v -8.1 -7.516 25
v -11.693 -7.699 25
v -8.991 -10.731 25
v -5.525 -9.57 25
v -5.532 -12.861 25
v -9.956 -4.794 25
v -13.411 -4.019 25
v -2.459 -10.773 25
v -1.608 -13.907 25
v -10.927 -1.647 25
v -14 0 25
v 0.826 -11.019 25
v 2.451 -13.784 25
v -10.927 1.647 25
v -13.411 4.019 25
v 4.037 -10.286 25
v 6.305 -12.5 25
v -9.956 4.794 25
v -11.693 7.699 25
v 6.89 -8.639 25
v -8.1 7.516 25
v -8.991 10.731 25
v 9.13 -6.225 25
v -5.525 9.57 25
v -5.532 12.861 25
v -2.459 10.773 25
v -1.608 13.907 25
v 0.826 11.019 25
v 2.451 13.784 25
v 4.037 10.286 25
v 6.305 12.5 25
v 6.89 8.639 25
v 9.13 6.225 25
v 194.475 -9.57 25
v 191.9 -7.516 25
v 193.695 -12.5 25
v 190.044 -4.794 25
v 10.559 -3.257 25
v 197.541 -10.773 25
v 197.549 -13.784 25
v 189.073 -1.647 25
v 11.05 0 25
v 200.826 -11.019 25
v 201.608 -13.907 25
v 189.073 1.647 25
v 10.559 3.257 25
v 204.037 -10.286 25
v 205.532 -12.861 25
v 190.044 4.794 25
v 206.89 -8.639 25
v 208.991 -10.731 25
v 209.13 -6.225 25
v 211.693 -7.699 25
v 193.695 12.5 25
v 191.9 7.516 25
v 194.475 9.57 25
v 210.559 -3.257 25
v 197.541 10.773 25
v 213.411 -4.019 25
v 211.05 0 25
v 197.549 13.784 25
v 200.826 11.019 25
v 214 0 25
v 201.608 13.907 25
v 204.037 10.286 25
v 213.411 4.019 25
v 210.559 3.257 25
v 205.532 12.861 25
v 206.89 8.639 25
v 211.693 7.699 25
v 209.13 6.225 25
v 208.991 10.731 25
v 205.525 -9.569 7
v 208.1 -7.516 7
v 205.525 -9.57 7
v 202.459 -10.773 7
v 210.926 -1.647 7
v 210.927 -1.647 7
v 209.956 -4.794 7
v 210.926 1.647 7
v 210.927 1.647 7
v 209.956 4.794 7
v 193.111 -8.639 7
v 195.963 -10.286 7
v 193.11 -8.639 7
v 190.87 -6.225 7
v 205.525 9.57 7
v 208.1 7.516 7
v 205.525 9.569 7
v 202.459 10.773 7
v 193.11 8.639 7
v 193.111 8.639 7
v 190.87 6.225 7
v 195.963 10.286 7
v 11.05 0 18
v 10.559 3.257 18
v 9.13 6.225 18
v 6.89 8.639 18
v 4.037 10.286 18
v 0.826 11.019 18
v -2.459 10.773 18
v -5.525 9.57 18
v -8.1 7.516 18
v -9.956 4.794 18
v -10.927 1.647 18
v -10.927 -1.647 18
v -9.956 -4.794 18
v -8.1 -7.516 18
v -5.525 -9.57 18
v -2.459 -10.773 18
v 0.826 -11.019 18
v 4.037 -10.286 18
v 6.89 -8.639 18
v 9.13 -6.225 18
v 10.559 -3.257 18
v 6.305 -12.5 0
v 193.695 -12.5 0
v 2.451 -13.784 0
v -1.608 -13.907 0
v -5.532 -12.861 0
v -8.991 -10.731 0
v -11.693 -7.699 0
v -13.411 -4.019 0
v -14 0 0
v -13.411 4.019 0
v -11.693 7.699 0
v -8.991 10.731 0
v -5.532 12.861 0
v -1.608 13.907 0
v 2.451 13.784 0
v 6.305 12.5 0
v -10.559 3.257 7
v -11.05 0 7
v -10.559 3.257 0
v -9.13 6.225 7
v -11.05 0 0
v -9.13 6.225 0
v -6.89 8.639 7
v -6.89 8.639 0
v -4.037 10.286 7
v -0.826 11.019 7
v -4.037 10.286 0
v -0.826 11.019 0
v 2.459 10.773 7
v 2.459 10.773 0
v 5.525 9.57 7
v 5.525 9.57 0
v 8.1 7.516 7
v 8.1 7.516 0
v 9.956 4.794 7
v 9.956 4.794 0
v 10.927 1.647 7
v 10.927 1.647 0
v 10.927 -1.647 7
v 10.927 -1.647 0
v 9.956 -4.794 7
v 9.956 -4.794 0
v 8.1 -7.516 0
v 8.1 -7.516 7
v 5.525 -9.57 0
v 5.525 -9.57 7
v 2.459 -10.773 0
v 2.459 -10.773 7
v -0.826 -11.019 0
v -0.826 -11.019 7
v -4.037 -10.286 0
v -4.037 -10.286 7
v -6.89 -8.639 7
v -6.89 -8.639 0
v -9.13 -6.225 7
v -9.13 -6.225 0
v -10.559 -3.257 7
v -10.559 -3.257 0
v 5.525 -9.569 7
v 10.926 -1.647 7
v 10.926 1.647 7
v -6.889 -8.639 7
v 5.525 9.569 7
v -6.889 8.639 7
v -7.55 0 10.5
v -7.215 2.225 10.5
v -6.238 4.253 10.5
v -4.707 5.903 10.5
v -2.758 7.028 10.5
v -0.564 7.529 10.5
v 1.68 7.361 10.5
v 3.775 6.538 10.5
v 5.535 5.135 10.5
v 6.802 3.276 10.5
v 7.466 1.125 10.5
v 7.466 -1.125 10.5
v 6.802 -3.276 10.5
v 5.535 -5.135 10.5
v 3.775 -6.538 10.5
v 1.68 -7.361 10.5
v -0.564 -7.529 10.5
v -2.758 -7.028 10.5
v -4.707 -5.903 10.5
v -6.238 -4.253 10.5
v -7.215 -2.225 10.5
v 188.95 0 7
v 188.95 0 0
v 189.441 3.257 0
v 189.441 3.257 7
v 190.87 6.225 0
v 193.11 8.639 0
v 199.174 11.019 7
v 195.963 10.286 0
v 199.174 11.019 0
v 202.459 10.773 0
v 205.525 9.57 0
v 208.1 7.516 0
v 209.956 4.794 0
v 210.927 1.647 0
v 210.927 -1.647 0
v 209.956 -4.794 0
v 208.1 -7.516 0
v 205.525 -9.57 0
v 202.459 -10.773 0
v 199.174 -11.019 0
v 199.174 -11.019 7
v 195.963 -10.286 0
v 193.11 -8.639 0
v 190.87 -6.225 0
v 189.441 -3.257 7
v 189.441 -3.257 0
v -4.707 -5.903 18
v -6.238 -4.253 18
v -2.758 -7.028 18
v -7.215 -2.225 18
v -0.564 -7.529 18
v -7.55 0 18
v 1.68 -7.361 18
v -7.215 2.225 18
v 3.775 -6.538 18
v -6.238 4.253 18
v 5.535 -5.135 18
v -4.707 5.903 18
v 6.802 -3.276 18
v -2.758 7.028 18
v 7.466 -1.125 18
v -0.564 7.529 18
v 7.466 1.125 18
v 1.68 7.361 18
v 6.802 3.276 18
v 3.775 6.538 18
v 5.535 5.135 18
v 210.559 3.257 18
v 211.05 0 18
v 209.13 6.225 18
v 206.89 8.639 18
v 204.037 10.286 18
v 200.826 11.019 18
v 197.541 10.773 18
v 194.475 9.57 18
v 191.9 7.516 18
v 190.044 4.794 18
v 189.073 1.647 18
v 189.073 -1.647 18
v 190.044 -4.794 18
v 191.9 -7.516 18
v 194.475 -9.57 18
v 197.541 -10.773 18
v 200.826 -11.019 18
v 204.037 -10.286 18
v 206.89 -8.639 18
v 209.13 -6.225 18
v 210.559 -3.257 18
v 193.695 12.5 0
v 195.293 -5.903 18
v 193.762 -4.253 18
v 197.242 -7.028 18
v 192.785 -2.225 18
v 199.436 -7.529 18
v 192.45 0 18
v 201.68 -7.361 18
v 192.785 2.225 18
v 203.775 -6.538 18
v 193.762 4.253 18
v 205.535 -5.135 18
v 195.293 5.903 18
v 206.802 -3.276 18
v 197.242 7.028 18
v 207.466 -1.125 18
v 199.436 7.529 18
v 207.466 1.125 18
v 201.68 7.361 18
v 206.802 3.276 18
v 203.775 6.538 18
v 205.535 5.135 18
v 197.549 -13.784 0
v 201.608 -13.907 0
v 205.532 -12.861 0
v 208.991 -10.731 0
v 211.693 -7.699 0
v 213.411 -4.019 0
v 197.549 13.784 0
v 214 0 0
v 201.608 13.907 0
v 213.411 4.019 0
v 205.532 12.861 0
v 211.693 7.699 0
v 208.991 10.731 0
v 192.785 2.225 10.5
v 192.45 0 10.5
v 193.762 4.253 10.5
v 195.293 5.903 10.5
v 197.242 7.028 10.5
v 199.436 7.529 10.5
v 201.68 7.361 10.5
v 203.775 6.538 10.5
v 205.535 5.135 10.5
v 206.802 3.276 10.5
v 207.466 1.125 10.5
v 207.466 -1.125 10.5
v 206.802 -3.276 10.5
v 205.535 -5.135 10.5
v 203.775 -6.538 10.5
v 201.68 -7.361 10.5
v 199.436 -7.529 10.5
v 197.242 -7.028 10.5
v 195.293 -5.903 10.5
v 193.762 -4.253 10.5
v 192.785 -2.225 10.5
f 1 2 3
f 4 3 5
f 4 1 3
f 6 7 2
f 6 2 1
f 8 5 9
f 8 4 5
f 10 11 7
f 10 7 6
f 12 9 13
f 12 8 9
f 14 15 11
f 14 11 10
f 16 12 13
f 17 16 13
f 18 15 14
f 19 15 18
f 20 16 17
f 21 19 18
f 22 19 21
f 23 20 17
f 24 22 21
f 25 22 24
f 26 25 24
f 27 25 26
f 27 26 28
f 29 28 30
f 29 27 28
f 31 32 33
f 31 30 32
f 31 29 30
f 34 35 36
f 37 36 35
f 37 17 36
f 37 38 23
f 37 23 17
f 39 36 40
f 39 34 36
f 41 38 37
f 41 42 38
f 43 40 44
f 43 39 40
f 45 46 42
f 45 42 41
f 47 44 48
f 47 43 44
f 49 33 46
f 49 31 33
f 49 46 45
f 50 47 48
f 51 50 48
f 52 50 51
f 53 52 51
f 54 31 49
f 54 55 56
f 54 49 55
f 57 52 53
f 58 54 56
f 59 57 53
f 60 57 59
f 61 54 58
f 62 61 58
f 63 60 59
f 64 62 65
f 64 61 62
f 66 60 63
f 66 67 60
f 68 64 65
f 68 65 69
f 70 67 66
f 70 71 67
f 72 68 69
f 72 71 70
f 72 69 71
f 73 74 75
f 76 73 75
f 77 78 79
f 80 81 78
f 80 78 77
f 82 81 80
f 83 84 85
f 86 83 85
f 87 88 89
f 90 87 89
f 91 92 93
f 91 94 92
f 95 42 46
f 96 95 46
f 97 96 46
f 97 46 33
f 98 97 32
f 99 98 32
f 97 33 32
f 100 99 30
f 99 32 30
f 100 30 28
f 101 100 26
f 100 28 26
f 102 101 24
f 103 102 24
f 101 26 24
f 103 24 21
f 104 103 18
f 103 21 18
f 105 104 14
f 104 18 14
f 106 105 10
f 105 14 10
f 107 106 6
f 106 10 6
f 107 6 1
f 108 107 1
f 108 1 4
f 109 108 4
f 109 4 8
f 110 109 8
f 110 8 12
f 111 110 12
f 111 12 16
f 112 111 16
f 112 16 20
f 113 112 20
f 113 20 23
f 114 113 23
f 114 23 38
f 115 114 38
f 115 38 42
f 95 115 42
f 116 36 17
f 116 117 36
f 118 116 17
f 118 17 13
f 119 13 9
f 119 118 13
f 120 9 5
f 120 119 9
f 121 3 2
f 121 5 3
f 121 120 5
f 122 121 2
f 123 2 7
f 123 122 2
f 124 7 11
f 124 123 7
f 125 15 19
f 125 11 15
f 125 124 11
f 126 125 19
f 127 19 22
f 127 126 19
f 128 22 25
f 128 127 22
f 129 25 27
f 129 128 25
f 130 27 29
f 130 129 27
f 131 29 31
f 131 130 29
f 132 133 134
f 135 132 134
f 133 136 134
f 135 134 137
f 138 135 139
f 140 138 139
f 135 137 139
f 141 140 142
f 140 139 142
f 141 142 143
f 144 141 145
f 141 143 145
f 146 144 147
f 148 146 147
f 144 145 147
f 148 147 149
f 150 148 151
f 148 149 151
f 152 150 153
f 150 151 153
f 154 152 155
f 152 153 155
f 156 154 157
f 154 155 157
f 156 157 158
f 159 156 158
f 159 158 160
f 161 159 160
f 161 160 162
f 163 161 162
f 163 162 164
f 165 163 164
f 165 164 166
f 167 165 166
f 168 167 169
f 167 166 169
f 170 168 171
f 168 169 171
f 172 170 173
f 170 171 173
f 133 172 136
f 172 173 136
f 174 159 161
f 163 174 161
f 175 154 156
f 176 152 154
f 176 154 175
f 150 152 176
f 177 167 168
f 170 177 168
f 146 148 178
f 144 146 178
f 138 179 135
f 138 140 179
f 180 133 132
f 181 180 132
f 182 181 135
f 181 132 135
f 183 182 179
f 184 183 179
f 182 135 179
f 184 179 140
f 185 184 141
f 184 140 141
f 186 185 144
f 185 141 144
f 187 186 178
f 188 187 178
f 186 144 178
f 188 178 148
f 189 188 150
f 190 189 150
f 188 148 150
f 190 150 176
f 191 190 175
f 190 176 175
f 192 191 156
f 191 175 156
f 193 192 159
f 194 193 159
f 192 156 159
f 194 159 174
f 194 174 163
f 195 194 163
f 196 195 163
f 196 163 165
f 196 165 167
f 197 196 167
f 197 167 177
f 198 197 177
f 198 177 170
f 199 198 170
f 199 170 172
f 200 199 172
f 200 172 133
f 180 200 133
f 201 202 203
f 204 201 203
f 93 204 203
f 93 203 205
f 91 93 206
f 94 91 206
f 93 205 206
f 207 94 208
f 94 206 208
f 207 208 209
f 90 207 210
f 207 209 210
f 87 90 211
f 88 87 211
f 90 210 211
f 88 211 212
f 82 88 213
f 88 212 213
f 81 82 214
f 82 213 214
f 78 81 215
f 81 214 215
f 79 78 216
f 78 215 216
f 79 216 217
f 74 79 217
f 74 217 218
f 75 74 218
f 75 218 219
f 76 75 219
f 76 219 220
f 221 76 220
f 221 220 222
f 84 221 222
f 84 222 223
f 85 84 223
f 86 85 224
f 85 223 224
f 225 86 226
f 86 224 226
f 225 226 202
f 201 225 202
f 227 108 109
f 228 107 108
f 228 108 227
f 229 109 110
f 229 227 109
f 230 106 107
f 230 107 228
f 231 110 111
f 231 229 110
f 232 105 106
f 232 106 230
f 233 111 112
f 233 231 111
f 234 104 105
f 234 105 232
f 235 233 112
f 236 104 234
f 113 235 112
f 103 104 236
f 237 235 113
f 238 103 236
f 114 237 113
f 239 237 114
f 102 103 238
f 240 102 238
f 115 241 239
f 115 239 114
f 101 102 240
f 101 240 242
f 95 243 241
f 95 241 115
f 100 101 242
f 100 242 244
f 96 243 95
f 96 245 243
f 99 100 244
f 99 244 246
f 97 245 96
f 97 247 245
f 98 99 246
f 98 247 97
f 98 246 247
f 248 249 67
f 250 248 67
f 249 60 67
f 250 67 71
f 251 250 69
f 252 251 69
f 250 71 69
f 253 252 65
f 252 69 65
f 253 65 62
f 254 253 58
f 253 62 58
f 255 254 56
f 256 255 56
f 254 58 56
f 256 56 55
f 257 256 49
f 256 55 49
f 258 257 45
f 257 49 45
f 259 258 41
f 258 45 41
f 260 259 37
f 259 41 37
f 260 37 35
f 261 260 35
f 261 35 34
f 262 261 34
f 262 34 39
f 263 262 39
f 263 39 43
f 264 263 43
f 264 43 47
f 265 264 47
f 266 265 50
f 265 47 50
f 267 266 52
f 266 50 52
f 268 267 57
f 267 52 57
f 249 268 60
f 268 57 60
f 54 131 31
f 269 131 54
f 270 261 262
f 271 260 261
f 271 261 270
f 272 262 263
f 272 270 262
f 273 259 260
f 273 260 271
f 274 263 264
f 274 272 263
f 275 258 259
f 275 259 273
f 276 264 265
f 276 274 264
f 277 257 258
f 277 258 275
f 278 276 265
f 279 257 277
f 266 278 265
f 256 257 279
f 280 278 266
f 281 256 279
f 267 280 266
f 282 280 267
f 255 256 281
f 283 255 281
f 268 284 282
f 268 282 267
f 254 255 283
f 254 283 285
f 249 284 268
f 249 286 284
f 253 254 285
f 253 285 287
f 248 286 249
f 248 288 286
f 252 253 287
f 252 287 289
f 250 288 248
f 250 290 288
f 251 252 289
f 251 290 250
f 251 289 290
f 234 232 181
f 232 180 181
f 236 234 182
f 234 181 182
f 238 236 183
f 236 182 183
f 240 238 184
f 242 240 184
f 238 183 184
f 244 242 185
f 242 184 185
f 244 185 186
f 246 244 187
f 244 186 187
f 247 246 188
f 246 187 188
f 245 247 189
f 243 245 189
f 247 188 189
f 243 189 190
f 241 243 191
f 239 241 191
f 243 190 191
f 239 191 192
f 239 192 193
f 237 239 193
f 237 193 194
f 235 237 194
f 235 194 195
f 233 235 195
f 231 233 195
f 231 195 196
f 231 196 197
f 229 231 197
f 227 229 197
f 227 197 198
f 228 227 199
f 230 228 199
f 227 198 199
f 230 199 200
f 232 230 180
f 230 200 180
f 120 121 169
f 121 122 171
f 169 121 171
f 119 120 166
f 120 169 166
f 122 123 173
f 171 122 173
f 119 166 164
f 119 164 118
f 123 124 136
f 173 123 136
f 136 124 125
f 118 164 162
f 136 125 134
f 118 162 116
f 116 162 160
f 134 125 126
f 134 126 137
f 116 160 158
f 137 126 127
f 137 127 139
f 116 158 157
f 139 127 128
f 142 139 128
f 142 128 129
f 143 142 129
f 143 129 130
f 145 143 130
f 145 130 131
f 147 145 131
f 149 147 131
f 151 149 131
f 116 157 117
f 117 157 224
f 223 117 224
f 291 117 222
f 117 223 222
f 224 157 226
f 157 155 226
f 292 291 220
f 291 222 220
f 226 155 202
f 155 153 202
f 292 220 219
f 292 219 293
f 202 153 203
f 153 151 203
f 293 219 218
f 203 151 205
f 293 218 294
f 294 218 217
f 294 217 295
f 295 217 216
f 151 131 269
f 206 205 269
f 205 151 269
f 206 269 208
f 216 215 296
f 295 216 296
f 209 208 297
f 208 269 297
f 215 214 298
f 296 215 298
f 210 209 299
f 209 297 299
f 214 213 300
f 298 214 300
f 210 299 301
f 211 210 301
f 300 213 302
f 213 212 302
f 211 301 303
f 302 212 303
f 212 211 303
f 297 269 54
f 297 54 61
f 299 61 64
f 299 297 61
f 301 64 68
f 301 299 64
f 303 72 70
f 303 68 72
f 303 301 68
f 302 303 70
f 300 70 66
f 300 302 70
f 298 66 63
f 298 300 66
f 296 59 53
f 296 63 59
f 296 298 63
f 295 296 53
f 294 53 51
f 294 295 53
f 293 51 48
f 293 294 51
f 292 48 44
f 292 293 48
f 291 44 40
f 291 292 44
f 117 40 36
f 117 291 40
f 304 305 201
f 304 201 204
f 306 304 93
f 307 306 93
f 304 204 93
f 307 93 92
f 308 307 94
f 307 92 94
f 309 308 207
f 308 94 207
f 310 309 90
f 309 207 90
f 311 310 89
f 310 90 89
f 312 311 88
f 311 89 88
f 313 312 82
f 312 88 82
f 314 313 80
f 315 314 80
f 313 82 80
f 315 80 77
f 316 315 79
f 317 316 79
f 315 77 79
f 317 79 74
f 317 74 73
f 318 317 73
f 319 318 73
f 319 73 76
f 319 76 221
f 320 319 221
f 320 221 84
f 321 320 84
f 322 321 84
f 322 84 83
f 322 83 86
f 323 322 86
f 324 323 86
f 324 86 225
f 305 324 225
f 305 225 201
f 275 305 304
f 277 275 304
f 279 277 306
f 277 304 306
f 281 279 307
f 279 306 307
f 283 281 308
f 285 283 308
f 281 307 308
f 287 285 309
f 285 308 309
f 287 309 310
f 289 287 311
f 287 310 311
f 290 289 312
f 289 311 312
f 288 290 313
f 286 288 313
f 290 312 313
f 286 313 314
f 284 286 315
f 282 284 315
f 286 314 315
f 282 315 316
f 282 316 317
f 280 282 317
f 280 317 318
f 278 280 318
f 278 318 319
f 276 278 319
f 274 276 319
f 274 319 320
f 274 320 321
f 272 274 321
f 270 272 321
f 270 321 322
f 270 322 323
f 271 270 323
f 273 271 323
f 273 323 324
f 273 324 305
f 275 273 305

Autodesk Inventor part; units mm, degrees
ref_plane "YZ Plane" through (0, 0, 0) normal (1, 0, 0) x (0, 1, 0)
ref_plane "XZ Plane" through (0, 0, 0) normal (0, 1, 0) x (-1, 0, 0)
ref_plane "XY Plane" through (0, 0, 0) normal (0, 0, 1) x (1, 0, 0)
sketch "Sketch1" plane through (0, 0, 0) normal (0, 0, 1) x (1, 0, 0)
  arc A0 (6.3048, 12.5) -> (6.3048, -12.5) centre (0, 0) ccw
  arc A1 (193.6952, -12.5) -> (193.6952, 12.5) centre (200, 0) ccw
  line L0 (6.3048, 12.5) -> (193.6952, 12.5)
  line L1 (193.6952, -12.5) -> (6.3048, -12.5)
  dimension "d0" = 25
  dimension "d2" = 14
  dimension "d3" = 200
extrude "Extrusion1" add sketch "Sketch1" along normal blind 25
sketch "Sketch2" plane through (0, 0, 25) normal (0, 0, 1) x (1, 0, 0)
  arc A0 (6.3048, 12.5) -> (6.3048, -12.5) centre (0, 0) ccw projected
  arc A1 (193.6952, -12.5) -> (193.6952, 12.5) centre (200, 0) ccw projected
  circle A2 centre (0, 0) radius 11.05
  circle A3 centre (200, 0) radius 11.05
  dimension "d6" = 22.1
extrude "Extrusion2" cut sketch "Sketch2" against normal blind 7
sketch "Sketch3" plane through (0, 0, 0) normal (0, 0, -1) x (-1, 0, 0)
  circle A0 centre (-200, 0) radius 11.05 projected
  circle A1 centre (0, 0) radius 11.05 projected
extrude "Extrusion3" cut sketch "Sketch3" against normal blind 7
sketch "Sketch4" plane through (200, 0, 7) normal (0, 0, -1) x (-1, 0, 0)
  circle A0 centre (0, 0) radius 11.05 projected
  circle A1 centre (200, 0) radius 11.05 projected
  circle A2 centre (0, 0) radius 7.55
  circle A3 centre (200, 0) radius 7.55
  dimension "d12" = 15.1
extrude "Extrusion4" cut sketch "Sketch4" against normal through all contours A2 | A3
chamfer "Chamfer1" distance 3.5 angle 45 2 edges at (207.55, 0, 7) (7.55, 0, 7)
properties part number "ARM"
